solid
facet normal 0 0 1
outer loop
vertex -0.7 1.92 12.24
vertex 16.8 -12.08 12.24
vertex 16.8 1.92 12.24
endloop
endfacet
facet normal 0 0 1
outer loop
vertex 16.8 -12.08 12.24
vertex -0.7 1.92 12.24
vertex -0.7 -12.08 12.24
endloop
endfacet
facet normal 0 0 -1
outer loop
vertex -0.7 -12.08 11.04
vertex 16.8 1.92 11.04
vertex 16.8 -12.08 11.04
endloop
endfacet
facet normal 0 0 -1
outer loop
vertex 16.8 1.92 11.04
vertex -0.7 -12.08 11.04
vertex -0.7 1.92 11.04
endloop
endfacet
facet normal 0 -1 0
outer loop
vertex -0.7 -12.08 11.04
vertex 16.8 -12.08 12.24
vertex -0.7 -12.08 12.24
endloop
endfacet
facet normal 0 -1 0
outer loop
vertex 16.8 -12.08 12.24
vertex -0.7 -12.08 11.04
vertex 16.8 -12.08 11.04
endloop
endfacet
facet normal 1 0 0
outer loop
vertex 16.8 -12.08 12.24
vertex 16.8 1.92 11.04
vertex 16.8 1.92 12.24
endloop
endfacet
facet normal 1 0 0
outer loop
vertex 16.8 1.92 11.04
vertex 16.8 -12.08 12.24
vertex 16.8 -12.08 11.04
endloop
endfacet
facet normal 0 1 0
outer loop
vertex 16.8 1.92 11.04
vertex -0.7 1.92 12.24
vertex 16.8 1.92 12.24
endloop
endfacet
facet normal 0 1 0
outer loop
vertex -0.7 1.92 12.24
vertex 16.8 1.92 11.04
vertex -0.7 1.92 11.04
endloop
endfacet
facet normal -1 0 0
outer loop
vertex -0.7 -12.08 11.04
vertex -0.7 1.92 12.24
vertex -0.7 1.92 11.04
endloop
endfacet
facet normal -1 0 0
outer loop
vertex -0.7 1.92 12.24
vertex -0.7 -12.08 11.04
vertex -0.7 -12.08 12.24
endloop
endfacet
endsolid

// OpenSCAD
// DS3231 "mini" RTC module (U13), lying over TS06-DRV on its female header, which plugs on the 5-way PLS male header
// of the footprint. Made for 3d/populated. The male header itself is KiCad's PinHeader_1x05 model (models3d.json).
//
// layers: socket=#1d1d1f pcb=#1c4f9c ic=#202022 gold=#d1ad45 cap=#b99a5a
//
// FRAME  KiCad model frame of the base footprint TS06_PinHeader_1x05_DS3231 (pads along -y from (0, 0), a footprint's y
//        negated); the board's U13 is the _R270 copy and gets there through tools/models3d.py's variant rule.
//
// DIMENSIONS                            value                   kind
//   module footprint on the board      x -0.7..16.8, y 1.92..-12.08 (17.5 x 14.0)   MEASURED (repo source): the footprint's F.Fab /
//                                                     F.SilkS rectangle (x 1.27..16.8, y -1.92..12.08 in footprint y) plus 2.0 mm
//                                                     back to the header axis; the descr says "~14 x 16 mm"
//   female socket      2.54 x 12.7 x 8.5            INFERRED: a 5-way 2.54 mm socket (PCB/TS06-DRV/bom.md: PBS 8.5 mm)
//   seat               socket bottom on the PLS body top, 2.54 mm   INFERRED (case_pair.py PLS_BODY 2.5)
//   PCB thickness      1.2 mm                      INFERRED
//   DS3231 SOIC-16W    10.3 x 7.5 x 2.65           INFERRED (datasheet package outline, typical)
//   EEPROM SOIC-8      5.0 x 4.0 x 1.75            INFERRED
//   overall height     14.8 mm above the board face    DERIVED; the footprint descr says "~15 mm tall", case_pair.py FP_H 22.0 for
//                                                     the older standing-module reading (see checks.md finding 6)
L = "pcb";
P = 2.54;
SOC_Z = 2.54;
SOC_H = 8.5;
PCB_Z = SOC_Z + SOC_H;          // 11.04
PCB_T = 1.2;
X0 = -0.7;
X1 = 16.8;
Y0 = 1.92;                      // model y of the +y edge
Y1 = -12.08;

if (L == "socket") translate([-1.27, -4 * P - 1.27, SOC_Z]) cube([2.54, 5 * P, SOC_H]);
if (L == "pcb") translate([X0, Y1, PCB_Z]) cube([X1 - X0, Y0 - Y1, PCB_T]);
if (L == "ic") {
    translate([5.0, -5.08 - 3.75, PCB_Z + PCB_T]) cube([10.3, 7.5, 2.65]);        // DS3231
    translate([14.2, -5.08 + 6.0, PCB_Z + PCB_T]) cube([2.0, 4.0, 1.0]);          // a passive row
    translate([2.2, -5.08 - 2.5, PCB_Z + PCB_T]) cube([2.5, 5.0, 1.75]);          // EEPROM, rotated
}
if (L == "gold") for (i = [0 : 4]) translate([0, -i * P, PCB_Z + PCB_T + 0.01]) cylinder(d = 1.6, h = 0.05, $fn = 18);
if (L == "cap") translate([8.0, -5.08 + 5.5, PCB_Z + PCB_T]) cube([3.2, 1.6, 1.0]);
